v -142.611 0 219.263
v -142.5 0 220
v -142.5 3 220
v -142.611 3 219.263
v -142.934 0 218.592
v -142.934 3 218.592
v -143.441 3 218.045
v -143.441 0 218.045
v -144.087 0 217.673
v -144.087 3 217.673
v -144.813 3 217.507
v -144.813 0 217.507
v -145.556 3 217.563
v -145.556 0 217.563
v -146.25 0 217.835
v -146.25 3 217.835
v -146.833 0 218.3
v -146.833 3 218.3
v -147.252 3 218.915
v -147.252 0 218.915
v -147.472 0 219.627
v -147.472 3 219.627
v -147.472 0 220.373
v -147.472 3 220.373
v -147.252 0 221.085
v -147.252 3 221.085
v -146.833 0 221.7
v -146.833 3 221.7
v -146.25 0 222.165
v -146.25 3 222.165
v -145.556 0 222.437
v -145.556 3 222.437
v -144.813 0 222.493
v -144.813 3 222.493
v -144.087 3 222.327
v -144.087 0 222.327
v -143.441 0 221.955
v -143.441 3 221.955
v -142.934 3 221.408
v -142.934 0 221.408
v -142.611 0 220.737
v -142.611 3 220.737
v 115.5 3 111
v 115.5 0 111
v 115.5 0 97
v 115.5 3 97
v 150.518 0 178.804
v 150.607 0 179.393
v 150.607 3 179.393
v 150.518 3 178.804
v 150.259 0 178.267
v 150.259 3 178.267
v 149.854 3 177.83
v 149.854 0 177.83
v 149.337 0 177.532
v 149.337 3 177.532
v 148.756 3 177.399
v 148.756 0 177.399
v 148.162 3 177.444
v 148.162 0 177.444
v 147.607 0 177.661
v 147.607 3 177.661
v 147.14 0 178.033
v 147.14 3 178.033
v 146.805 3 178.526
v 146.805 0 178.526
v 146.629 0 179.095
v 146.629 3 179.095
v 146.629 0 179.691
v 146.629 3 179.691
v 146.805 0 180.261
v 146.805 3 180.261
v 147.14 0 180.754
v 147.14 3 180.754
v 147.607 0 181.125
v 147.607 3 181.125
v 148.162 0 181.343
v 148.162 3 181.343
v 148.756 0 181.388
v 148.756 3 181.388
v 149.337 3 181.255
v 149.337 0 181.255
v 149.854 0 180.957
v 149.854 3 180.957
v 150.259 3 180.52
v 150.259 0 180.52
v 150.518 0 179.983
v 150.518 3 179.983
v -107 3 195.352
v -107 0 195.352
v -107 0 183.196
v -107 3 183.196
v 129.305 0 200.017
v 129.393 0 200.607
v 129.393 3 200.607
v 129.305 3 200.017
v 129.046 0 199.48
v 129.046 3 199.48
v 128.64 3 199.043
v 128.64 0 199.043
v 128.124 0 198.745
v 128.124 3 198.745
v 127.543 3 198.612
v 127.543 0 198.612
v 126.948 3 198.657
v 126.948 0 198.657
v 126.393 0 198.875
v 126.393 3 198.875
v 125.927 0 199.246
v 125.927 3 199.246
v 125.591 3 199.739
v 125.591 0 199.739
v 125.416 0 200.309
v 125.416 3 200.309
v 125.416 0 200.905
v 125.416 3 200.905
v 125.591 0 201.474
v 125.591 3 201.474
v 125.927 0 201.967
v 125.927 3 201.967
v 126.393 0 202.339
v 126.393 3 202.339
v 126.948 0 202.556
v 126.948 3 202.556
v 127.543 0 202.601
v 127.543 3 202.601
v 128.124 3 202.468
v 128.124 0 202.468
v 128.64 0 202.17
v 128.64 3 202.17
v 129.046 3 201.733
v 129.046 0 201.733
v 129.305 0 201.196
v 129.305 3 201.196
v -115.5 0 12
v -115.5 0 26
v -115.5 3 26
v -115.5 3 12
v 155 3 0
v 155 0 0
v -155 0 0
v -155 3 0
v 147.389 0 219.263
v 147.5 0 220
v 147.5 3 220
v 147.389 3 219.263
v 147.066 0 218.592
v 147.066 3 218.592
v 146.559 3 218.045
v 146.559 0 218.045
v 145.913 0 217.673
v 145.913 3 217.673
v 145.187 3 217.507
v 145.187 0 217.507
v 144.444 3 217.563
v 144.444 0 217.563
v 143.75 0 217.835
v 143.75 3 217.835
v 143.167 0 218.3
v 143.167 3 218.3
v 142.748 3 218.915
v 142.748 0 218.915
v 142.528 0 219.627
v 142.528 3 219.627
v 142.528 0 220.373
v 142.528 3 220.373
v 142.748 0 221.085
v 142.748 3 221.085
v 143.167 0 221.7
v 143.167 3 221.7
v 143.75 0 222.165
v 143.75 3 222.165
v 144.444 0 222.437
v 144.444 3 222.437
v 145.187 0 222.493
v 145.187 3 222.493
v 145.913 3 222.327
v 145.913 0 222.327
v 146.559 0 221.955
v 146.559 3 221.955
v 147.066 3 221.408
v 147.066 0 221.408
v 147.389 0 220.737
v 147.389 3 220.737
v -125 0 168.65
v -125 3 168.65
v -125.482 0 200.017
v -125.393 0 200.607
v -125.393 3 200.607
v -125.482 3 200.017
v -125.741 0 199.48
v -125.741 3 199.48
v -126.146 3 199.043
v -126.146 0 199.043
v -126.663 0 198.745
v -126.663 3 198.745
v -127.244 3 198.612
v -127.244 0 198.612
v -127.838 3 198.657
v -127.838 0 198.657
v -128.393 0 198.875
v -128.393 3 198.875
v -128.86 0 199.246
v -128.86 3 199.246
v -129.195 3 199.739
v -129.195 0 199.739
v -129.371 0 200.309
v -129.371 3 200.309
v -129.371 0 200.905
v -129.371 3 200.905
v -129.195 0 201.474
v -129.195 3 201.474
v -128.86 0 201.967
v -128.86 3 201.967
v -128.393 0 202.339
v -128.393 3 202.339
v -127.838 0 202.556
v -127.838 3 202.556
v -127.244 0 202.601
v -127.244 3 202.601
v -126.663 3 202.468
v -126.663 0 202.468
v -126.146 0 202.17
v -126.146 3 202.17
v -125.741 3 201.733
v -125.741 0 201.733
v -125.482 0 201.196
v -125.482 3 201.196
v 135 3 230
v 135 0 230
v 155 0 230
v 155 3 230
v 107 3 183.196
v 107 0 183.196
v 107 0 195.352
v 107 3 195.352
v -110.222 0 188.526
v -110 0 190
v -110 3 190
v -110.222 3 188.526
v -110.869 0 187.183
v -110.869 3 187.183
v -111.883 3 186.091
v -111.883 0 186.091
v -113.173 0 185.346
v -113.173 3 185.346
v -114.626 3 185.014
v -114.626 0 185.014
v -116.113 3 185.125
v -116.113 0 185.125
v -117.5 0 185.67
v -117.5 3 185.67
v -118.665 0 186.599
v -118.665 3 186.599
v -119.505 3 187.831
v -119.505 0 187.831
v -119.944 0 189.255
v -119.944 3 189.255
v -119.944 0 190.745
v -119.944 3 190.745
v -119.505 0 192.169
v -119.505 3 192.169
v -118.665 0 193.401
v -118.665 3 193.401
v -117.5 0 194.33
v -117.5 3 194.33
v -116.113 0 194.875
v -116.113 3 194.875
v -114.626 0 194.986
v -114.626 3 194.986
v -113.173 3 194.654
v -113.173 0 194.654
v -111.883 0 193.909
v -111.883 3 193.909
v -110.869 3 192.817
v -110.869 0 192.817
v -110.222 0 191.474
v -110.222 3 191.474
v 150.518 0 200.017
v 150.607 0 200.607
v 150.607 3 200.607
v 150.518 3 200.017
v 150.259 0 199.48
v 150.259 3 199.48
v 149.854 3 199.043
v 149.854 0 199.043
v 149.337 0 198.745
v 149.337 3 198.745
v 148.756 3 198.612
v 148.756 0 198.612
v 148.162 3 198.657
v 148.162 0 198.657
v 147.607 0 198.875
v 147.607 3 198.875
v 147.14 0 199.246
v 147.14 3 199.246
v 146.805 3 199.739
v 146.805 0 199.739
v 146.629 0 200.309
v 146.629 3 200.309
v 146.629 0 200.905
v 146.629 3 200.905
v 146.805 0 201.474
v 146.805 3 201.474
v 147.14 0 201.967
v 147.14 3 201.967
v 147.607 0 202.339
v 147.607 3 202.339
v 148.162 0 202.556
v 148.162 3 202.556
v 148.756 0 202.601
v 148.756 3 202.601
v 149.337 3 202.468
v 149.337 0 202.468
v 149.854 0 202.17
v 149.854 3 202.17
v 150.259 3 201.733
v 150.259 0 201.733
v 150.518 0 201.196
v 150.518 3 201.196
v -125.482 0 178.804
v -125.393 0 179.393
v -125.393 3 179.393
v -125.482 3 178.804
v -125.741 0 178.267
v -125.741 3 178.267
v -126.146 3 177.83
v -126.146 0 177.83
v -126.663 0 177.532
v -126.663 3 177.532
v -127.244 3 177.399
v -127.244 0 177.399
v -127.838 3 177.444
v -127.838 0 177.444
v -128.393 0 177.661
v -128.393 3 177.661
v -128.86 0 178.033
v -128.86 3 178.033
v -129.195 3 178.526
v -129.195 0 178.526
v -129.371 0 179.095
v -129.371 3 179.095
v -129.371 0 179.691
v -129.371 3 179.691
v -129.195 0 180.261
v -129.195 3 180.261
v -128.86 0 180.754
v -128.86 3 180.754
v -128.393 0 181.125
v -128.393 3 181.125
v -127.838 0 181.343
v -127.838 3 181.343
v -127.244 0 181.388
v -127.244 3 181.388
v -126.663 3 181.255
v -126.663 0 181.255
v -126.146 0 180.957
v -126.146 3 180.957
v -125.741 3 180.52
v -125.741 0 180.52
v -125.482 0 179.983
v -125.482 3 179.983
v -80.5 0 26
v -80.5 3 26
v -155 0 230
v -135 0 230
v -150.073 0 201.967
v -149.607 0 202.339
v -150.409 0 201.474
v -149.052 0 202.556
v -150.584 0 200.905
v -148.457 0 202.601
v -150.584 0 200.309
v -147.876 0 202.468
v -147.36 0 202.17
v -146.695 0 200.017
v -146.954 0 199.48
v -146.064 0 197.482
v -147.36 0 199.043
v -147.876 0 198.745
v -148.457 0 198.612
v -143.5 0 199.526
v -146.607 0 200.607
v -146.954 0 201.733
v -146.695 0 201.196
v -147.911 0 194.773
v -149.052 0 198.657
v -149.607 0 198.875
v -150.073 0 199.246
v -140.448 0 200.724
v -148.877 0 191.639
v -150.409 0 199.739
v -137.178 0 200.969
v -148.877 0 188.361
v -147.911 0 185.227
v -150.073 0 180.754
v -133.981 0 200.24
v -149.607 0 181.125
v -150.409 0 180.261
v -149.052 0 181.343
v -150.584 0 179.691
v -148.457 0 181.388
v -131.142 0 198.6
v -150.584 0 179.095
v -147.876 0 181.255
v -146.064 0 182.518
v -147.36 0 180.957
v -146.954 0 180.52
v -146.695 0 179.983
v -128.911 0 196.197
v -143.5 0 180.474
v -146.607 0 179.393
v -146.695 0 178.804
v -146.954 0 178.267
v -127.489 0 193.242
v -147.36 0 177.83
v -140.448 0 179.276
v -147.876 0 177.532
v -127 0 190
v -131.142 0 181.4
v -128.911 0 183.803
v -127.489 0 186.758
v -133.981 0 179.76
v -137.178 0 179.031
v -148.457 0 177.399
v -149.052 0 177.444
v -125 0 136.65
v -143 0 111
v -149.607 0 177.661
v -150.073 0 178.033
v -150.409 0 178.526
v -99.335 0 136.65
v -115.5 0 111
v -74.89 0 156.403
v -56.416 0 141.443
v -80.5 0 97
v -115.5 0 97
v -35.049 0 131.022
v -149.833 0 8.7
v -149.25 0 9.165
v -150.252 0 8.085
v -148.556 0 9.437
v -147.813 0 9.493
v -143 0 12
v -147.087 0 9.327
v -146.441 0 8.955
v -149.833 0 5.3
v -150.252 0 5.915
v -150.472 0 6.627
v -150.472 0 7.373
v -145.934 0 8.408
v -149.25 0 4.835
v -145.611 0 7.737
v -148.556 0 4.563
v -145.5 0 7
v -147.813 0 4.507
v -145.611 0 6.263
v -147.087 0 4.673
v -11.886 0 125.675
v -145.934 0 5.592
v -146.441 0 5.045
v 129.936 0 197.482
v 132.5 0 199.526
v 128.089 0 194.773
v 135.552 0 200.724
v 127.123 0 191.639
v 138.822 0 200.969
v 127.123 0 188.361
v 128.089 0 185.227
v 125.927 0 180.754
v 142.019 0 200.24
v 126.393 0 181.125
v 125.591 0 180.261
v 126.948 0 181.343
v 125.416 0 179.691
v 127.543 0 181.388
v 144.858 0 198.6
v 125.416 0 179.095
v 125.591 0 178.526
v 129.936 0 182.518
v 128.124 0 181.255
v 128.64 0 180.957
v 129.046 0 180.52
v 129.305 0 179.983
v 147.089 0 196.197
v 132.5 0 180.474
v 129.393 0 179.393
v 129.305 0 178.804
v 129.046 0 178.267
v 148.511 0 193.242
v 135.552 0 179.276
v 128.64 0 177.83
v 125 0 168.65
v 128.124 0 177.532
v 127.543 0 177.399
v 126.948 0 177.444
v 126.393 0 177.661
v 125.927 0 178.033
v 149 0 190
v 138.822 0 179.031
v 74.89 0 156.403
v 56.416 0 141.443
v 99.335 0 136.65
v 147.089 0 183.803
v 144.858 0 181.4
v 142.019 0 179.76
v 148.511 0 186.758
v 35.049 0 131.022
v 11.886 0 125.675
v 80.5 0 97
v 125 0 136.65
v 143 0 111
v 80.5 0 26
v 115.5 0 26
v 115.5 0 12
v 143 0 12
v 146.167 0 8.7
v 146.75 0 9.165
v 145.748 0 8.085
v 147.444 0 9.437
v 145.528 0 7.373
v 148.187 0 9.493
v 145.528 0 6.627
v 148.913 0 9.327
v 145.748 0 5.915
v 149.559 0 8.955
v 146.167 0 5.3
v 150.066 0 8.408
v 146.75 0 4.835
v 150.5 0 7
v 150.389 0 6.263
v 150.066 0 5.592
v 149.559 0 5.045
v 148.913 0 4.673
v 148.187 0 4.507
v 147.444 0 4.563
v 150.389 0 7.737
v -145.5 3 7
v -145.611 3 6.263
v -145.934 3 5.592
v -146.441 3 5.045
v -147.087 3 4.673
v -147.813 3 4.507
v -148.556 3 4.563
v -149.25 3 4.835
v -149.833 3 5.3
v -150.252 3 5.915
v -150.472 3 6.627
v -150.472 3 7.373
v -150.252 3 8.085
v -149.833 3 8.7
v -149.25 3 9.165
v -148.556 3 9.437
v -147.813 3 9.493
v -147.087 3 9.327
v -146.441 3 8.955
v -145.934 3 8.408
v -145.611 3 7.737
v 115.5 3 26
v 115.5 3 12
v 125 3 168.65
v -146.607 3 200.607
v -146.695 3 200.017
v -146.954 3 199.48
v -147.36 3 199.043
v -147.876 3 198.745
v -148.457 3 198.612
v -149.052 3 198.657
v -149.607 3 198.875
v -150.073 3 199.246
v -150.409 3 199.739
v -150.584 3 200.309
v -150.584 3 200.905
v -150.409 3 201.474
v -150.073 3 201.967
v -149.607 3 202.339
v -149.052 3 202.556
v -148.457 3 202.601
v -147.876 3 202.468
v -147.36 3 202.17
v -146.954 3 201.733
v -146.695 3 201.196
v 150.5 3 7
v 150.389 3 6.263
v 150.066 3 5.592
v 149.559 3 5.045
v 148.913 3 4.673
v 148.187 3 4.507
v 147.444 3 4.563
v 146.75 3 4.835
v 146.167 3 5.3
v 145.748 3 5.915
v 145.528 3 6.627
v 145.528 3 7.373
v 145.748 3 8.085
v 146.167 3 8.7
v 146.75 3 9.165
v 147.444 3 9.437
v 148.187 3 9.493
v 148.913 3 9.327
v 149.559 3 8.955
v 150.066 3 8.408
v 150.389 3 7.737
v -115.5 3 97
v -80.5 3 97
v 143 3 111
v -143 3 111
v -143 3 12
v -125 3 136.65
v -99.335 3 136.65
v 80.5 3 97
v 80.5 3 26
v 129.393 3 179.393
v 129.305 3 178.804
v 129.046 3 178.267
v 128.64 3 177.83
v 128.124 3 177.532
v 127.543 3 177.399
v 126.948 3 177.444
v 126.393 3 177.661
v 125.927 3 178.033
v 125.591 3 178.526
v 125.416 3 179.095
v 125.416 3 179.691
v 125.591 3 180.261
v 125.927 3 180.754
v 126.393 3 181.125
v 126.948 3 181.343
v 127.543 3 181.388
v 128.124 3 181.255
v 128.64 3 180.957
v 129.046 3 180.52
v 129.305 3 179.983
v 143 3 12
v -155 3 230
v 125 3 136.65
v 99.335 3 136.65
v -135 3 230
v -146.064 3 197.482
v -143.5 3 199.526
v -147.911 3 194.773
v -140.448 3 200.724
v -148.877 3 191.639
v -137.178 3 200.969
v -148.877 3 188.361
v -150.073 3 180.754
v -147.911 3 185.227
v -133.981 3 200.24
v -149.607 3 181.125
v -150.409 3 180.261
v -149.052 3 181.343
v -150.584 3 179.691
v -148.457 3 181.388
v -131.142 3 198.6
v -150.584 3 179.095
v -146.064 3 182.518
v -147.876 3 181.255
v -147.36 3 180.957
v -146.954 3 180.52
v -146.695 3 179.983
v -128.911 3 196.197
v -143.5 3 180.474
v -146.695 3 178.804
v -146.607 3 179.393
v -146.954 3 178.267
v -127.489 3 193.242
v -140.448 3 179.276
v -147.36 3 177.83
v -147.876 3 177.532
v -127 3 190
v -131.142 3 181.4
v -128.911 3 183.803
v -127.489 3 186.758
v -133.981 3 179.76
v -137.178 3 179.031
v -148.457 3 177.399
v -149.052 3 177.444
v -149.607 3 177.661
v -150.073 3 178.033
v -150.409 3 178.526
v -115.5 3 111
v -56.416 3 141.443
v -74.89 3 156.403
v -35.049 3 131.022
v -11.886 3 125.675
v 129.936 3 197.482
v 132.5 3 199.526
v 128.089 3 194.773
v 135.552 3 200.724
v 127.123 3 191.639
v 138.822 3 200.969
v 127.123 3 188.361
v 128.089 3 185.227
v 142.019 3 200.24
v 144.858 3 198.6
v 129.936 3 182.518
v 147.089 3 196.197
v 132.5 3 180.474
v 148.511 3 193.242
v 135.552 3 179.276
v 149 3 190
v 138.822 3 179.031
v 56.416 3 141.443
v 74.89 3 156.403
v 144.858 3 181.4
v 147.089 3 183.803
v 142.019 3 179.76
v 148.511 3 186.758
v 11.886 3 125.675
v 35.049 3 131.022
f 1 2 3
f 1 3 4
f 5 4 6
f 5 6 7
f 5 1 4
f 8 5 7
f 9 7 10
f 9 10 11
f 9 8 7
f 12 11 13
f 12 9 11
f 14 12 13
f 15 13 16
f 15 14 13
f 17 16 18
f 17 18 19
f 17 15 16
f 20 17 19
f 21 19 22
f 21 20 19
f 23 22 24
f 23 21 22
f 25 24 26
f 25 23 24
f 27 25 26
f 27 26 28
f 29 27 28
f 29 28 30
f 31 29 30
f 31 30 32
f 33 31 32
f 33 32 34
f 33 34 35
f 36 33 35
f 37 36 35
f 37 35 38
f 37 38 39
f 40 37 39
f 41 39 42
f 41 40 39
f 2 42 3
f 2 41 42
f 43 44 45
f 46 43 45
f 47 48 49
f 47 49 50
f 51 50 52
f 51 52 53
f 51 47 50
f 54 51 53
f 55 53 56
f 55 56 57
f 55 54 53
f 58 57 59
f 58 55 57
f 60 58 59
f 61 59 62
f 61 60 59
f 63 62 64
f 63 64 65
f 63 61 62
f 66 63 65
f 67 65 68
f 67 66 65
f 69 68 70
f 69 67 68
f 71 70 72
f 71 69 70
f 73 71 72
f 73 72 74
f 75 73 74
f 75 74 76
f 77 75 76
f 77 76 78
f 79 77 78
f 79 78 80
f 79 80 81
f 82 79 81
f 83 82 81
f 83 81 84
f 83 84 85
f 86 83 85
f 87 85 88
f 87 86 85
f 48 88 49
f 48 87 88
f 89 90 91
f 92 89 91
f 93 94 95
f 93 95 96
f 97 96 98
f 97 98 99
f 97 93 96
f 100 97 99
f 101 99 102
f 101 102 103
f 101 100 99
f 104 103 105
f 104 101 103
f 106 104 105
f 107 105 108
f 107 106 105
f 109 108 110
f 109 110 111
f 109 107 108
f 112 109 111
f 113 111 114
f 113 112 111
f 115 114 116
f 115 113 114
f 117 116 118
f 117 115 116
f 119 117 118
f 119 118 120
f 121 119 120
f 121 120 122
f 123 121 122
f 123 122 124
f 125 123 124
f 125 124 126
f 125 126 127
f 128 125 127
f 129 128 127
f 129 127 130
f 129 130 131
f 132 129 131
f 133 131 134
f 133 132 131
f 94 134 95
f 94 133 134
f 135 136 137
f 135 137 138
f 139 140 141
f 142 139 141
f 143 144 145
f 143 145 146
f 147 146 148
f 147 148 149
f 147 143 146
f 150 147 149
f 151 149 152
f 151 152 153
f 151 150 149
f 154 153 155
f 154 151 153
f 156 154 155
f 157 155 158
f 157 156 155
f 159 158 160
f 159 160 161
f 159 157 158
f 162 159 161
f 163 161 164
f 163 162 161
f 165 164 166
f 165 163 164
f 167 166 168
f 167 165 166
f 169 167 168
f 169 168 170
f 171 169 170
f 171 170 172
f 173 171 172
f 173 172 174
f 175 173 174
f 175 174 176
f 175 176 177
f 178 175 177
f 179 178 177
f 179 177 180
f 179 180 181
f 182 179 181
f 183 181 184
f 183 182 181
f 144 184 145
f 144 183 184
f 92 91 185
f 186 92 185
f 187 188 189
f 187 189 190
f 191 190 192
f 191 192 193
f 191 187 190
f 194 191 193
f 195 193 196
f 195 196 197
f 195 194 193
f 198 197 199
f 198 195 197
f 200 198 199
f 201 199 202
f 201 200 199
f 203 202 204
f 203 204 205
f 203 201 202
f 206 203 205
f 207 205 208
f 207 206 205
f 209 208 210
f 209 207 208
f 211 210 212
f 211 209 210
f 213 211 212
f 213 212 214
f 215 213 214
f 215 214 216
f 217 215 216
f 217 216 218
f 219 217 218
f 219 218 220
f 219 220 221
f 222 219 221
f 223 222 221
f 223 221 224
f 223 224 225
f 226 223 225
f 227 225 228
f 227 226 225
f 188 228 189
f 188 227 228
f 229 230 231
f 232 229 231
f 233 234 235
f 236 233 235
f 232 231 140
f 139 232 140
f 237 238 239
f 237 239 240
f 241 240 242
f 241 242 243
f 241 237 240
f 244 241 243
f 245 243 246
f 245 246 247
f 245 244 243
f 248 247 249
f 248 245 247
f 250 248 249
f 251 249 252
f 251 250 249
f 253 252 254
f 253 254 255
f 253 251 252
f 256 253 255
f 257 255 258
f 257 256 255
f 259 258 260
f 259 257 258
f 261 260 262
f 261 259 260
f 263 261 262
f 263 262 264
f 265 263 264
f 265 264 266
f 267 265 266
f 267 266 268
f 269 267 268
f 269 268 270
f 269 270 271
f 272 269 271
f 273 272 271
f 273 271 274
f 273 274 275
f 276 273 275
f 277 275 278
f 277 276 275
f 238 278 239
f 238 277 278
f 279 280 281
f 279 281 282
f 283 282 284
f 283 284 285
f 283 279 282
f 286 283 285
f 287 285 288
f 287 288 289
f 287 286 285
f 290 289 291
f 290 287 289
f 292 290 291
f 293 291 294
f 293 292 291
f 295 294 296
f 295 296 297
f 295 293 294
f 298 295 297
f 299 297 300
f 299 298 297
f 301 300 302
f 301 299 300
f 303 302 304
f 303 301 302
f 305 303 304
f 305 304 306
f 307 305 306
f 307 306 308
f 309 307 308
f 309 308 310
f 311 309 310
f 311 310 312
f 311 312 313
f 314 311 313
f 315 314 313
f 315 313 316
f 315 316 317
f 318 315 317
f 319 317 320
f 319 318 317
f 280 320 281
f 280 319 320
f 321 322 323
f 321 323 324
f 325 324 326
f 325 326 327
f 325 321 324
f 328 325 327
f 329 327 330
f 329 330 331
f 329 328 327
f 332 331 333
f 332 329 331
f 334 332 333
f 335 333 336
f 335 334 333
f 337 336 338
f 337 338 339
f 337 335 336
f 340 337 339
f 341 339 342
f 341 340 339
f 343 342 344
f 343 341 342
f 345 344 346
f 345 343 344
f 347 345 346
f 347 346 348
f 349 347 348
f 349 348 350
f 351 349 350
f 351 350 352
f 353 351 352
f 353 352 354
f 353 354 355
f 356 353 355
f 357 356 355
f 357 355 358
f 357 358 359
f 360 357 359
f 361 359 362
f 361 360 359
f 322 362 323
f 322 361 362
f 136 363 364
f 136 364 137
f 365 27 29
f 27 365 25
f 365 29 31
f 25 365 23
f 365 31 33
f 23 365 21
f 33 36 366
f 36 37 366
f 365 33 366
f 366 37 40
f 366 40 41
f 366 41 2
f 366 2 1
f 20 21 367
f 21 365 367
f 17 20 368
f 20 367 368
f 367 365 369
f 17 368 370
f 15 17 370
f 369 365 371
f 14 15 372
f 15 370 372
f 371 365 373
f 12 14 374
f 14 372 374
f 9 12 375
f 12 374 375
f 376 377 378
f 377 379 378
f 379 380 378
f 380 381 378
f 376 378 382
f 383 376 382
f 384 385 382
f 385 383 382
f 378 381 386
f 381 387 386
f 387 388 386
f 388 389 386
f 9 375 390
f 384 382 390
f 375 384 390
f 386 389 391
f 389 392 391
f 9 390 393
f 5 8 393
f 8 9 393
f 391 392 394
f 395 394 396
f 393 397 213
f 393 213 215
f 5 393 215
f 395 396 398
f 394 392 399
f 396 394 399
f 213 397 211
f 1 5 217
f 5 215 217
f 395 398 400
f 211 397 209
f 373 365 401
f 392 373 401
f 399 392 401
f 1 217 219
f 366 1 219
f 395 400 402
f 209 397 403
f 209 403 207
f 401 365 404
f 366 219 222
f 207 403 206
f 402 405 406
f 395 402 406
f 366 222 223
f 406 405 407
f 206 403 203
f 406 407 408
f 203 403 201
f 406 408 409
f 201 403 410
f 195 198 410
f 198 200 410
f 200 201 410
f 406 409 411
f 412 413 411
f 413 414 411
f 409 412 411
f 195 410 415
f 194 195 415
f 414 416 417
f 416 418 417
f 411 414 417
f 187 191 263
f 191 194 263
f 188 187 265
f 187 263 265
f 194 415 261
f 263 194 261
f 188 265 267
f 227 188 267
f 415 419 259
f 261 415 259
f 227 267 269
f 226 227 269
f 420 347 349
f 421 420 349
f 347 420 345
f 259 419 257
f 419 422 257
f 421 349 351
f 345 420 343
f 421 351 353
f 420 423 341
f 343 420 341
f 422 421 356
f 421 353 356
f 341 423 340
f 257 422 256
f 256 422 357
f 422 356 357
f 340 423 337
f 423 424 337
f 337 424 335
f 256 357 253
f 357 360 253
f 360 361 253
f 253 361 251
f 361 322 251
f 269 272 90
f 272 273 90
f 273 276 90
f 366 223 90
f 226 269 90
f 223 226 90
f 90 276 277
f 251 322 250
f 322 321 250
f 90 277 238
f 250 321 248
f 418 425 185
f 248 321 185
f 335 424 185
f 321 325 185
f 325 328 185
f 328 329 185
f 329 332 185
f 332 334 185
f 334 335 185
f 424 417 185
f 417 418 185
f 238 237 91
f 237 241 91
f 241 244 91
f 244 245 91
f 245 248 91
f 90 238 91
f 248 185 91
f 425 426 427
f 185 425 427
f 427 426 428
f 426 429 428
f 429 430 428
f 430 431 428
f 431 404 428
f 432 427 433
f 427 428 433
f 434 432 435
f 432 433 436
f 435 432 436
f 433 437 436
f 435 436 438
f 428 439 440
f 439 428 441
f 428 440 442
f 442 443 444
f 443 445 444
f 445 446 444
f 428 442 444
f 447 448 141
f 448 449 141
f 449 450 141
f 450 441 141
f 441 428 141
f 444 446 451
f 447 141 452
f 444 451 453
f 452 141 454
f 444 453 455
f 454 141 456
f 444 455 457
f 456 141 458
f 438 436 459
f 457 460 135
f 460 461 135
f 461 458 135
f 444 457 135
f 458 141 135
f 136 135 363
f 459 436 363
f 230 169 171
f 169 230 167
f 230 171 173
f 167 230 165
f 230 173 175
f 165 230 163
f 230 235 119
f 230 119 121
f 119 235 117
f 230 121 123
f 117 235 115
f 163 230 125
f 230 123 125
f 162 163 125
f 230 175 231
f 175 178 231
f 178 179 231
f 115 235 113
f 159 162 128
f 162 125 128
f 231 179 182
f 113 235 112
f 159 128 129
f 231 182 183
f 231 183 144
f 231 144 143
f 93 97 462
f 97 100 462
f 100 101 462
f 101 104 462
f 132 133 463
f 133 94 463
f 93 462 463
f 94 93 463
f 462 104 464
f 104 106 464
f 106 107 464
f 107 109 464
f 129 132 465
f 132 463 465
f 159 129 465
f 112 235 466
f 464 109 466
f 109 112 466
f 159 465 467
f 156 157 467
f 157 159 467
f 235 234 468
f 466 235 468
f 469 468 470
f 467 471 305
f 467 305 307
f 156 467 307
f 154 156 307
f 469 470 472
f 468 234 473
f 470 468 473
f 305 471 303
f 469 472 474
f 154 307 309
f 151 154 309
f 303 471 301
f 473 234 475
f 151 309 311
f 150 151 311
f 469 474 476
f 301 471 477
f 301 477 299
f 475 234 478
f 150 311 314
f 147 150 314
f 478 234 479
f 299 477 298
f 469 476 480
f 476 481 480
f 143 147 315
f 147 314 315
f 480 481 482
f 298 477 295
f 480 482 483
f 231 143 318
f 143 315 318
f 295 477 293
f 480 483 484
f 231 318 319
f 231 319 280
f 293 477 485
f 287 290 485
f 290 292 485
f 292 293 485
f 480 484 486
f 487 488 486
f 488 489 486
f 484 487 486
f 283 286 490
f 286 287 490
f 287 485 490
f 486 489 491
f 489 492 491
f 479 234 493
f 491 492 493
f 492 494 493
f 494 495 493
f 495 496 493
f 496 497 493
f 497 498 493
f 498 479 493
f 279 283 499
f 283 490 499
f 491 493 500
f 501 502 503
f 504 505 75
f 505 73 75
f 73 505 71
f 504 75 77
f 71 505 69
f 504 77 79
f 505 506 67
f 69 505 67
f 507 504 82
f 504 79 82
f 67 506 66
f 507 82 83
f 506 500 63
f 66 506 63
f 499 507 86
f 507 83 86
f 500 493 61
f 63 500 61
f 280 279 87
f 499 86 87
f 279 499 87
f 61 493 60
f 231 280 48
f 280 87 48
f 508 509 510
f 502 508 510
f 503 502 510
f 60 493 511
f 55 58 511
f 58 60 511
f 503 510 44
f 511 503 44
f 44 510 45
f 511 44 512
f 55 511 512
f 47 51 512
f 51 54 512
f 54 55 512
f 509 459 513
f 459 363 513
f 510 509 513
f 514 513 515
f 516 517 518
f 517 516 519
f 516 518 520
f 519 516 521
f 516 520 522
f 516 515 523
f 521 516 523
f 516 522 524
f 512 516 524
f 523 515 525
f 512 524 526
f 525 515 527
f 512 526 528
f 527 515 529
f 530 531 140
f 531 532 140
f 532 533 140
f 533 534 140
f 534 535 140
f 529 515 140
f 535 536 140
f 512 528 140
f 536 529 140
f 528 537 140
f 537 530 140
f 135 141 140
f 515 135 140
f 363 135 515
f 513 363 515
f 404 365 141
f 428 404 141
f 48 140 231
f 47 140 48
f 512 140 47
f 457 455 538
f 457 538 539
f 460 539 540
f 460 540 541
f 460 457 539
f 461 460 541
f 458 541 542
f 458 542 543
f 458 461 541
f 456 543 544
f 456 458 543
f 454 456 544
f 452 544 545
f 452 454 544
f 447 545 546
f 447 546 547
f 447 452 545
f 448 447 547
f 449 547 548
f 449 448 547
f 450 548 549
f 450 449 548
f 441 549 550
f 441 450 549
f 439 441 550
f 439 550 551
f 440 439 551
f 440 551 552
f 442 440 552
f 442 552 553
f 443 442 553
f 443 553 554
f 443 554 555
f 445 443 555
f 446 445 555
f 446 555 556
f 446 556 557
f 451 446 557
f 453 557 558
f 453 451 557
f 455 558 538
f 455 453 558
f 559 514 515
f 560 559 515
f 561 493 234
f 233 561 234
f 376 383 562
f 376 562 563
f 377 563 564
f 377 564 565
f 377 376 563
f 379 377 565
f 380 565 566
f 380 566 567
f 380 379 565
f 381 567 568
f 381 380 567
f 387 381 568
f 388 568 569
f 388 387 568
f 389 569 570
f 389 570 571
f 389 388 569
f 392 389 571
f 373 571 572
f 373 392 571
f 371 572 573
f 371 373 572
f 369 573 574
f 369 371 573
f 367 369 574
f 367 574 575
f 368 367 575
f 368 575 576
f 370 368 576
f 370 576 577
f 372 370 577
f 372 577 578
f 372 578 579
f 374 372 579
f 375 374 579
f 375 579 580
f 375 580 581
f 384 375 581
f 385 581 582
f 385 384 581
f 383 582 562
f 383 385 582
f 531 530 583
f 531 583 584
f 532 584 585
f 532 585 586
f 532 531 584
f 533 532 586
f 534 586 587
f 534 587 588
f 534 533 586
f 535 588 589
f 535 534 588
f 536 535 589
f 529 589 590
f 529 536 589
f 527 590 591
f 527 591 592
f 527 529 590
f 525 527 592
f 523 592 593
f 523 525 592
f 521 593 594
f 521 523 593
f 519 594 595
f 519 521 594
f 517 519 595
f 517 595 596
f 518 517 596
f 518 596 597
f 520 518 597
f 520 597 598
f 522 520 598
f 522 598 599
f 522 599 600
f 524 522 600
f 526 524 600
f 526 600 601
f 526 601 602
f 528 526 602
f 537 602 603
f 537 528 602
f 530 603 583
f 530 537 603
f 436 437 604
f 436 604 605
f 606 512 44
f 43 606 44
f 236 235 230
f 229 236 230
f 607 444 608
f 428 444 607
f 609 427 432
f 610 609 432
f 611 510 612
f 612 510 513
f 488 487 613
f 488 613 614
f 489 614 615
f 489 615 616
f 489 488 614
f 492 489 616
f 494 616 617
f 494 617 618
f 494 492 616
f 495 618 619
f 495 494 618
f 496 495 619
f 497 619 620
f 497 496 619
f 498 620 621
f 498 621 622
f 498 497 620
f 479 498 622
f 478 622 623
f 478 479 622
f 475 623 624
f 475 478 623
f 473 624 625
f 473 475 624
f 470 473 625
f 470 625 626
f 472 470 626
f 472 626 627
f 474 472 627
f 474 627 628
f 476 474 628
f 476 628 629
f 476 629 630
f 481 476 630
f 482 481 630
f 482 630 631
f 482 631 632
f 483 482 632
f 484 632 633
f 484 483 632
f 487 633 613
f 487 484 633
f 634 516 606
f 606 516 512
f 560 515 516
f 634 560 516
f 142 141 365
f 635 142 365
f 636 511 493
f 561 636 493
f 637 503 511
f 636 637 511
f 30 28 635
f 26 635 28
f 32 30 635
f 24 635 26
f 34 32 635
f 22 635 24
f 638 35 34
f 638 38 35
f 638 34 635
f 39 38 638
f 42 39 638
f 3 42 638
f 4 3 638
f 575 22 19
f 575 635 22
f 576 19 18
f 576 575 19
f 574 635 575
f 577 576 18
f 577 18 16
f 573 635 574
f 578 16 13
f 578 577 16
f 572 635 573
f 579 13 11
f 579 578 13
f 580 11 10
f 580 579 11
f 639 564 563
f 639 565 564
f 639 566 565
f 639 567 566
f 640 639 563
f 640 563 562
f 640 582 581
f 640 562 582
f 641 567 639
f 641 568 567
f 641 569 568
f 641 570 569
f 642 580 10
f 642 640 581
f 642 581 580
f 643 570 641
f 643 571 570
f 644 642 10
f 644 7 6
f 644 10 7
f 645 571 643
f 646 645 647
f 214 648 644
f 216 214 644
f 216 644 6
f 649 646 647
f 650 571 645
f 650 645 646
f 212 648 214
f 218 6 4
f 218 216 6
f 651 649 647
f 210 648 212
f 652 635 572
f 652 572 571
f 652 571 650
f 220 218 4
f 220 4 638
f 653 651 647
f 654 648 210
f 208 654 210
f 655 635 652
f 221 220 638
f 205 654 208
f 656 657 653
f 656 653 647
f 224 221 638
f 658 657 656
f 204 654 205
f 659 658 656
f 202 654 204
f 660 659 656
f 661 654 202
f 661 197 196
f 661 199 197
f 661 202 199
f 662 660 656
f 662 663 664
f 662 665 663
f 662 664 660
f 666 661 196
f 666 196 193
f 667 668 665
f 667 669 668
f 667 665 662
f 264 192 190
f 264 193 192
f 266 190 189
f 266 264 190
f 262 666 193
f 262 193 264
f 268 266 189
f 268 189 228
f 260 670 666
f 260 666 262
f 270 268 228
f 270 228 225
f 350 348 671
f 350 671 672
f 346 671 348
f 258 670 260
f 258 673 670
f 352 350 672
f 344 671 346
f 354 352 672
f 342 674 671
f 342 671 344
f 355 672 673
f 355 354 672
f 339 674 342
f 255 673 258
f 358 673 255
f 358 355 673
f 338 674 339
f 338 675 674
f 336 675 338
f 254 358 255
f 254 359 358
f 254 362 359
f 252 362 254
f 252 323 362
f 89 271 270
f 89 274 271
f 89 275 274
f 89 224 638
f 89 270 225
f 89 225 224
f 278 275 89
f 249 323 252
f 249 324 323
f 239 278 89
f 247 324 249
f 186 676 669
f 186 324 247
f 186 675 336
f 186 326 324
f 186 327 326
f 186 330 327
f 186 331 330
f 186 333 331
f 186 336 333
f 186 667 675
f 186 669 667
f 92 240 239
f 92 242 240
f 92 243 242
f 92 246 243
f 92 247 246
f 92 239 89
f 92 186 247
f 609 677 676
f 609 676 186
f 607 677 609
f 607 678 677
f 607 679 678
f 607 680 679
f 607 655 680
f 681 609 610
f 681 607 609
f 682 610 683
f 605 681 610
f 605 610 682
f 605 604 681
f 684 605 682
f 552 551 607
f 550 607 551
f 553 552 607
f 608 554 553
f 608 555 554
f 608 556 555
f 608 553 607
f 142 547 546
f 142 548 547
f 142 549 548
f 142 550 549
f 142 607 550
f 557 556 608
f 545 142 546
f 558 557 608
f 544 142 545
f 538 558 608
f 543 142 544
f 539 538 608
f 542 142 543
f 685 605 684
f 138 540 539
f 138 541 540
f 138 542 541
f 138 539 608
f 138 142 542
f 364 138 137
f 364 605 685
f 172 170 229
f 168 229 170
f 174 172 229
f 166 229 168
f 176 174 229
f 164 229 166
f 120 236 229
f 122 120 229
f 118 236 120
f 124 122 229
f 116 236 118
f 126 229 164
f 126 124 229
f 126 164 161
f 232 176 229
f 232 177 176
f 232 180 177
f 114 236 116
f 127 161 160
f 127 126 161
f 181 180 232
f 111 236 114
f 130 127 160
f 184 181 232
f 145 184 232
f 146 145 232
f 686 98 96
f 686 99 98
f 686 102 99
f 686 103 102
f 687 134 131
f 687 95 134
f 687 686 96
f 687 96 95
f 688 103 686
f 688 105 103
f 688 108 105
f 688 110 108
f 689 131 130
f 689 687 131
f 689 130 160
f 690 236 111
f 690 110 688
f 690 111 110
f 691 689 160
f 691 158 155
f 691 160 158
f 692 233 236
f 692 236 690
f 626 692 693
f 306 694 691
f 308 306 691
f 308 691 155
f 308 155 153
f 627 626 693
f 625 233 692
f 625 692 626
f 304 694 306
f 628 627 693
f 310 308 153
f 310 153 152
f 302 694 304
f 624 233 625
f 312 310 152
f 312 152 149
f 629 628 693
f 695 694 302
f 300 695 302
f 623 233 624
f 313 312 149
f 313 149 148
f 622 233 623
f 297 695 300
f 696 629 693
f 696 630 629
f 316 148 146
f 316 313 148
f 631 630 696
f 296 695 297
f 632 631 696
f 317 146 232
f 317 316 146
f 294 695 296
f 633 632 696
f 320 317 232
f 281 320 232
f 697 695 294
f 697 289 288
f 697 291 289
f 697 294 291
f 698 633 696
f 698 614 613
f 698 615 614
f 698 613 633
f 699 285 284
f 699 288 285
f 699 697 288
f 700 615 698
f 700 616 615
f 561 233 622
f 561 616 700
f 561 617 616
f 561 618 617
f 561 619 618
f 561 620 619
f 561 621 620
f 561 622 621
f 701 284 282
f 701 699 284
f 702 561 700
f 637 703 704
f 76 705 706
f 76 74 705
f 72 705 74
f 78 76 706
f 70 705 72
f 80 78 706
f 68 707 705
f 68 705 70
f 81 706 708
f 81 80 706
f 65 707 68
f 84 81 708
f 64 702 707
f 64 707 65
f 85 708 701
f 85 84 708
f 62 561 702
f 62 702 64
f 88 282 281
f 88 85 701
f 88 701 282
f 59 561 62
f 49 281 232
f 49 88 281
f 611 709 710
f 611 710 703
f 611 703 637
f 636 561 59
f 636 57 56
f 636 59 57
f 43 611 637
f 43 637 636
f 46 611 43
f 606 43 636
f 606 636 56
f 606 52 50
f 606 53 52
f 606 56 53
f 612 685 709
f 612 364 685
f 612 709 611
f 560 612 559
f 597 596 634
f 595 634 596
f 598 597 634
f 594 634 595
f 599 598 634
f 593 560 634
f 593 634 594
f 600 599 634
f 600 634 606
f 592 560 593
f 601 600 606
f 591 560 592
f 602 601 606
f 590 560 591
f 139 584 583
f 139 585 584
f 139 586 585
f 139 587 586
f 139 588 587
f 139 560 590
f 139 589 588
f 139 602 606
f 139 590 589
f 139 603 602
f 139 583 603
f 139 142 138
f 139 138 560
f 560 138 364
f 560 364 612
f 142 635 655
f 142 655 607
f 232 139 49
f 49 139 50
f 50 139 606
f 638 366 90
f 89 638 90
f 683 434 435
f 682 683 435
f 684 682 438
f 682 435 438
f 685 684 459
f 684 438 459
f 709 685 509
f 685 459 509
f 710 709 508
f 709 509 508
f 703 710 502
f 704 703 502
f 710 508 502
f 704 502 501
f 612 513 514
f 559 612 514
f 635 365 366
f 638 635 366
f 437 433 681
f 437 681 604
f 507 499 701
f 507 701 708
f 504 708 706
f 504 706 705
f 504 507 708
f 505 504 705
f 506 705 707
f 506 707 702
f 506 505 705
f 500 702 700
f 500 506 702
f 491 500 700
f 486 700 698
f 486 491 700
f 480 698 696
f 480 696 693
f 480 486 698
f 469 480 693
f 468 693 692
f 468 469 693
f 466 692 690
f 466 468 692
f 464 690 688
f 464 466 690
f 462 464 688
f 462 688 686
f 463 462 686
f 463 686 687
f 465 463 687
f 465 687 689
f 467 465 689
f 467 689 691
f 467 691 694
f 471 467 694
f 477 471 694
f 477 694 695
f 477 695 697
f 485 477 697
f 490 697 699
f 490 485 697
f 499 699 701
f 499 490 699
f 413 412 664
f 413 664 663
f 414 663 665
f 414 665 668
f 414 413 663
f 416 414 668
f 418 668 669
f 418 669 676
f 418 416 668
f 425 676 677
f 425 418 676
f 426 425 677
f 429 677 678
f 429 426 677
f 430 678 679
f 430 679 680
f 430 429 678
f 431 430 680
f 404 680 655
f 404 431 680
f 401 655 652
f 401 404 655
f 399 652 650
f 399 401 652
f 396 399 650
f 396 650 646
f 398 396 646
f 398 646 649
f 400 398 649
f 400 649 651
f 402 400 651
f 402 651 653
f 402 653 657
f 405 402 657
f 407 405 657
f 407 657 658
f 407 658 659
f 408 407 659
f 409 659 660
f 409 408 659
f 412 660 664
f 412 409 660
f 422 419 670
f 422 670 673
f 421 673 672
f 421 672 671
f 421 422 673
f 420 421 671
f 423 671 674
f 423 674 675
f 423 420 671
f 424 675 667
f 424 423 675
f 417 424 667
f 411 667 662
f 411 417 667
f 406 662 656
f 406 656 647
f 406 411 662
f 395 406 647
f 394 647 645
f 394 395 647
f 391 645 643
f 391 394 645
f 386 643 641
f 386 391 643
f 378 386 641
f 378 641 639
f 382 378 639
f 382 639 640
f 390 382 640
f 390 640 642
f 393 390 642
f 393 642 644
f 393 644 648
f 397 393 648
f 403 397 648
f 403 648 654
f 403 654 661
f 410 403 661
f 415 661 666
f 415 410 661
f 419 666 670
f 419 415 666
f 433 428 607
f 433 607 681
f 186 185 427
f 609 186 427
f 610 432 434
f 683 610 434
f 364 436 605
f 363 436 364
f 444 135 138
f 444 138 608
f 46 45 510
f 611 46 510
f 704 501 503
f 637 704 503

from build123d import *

# Parameters (mm, degrees)
ESQUISSE1_R      = 2.5
ESQUISSE1_R_2    = 11
ESQUISSE1_R_3    = 2
ESQUISSE1_R_4    = 5
EXTRUSION1_DEPTH = 3


with BuildPart() as part:
    # Esquisse1 → Extrusion1 (new body)
    with BuildSketch(Plane(origin=(0, 0, 0), x_dir=(1, 0, 0), z_dir=(0, 1, 0))):
        with BuildLine():
            Line((155, 0), (-155, 0))
            Line((-155, 0), (-155, -230))
            Line((-155, -230), (-135, -230))
            Line((-135, -230), (-107, -195.351767722))
            Line((-107, -195.351767722), (-107, -183.195768703))
            Line((-107, -183.195768703), (-125, -168.649572061))
            Line((-125, -168.649572061), (-125, -136.649572061))
            Line((-125, -136.649572061), (-99.334512084, -136.649572061))
            Line((-99.334512084, -136.649572061), (-74.890281348, -156.403493564))
            ThreePointArc((-74.890281348, -156.403493564), (0, -125), (74.890281348, -156.403493564))
            Line((74.890281348, -156.403493564), (99.334512084, -136.649572061))
            Line((99.334512084, -136.649572061), (125, -136.649572061))
            Line((125, -136.649572061), (125, -168.649572061))
            Line((125, -168.649572061), (107, -183.195768703))
            Line((107, -183.195768703), (107, -195.351767722))
            Line((107, -195.351767722), (135, -230))
            Line((135, -230), (155, -230))
            Line((155, -230), (155, 0))
        make_face()
        with Locations((-148, -7)):
            Circle(ESQUISSE1_R, mode=Mode.SUBTRACT)
        with Locations((148, -7)):
            Circle(ESQUISSE1_R, mode=Mode.SUBTRACT)
        with Locations((-145, -220)):
            Circle(ESQUISSE1_R, mode=Mode.SUBTRACT)
        with Locations((145, -220)):
            Circle(ESQUISSE1_R, mode=Mode.SUBTRACT)
        with Locations((-138, -190)):
            Circle(ESQUISSE1_R_2, mode=Mode.SUBTRACT)
        with Locations((-148.606601718, -179.393398282)):
            Circle(ESQUISSE1_R_3, mode=Mode.SUBTRACT)
        with Locations((-127.393398282, -179.393398282)):
            Circle(ESQUISSE1_R_3, mode=Mode.SUBTRACT)
        with Locations((-127.393398282, -200.606601718)):
            Circle(ESQUISSE1_R_3, mode=Mode.SUBTRACT)
        with Locations((-148.606601718, -200.606601718)):
            Circle(ESQUISSE1_R_3, mode=Mode.SUBTRACT)
        with Locations((138, -190)):
            Circle(ESQUISSE1_R_2, mode=Mode.SUBTRACT)
        with Locations((148.606601718, -200.606601718)):
            Circle(ESQUISSE1_R_3, mode=Mode.SUBTRACT)
        with Locations((127.393398282, -200.606601718)):
            Circle(ESQUISSE1_R_3, mode=Mode.SUBTRACT)
        with Locations((127.393398282, -179.393398282)):
            Circle(ESQUISSE1_R_3, mode=Mode.SUBTRACT)
        with Locations((148.606601718, -179.393398282)):
            Circle(ESQUISSE1_R_3, mode=Mode.SUBTRACT)
        with Locations((-115, -190)):
            Circle(ESQUISSE1_R_4, mode=Mode.SUBTRACT)
        Polygon((-80.5, -26), (-115.5, -26), (-115.5, -12), (-143, -12), (-143, -111), (-115.5, -111), (-115.5, -97), (-80.5, -97), align=None, mode=Mode.SUBTRACT)
        Polygon((115.5, -26), (115.5, -12), (143, -12), (143, -111), (115.5, -111), (115.5, -97), (80.5, -97), (80.5, -26), align=None, mode=Mode.SUBTRACT)
    extrude(amount=EXTRUSION1_DEPTH)


solid = part.part
